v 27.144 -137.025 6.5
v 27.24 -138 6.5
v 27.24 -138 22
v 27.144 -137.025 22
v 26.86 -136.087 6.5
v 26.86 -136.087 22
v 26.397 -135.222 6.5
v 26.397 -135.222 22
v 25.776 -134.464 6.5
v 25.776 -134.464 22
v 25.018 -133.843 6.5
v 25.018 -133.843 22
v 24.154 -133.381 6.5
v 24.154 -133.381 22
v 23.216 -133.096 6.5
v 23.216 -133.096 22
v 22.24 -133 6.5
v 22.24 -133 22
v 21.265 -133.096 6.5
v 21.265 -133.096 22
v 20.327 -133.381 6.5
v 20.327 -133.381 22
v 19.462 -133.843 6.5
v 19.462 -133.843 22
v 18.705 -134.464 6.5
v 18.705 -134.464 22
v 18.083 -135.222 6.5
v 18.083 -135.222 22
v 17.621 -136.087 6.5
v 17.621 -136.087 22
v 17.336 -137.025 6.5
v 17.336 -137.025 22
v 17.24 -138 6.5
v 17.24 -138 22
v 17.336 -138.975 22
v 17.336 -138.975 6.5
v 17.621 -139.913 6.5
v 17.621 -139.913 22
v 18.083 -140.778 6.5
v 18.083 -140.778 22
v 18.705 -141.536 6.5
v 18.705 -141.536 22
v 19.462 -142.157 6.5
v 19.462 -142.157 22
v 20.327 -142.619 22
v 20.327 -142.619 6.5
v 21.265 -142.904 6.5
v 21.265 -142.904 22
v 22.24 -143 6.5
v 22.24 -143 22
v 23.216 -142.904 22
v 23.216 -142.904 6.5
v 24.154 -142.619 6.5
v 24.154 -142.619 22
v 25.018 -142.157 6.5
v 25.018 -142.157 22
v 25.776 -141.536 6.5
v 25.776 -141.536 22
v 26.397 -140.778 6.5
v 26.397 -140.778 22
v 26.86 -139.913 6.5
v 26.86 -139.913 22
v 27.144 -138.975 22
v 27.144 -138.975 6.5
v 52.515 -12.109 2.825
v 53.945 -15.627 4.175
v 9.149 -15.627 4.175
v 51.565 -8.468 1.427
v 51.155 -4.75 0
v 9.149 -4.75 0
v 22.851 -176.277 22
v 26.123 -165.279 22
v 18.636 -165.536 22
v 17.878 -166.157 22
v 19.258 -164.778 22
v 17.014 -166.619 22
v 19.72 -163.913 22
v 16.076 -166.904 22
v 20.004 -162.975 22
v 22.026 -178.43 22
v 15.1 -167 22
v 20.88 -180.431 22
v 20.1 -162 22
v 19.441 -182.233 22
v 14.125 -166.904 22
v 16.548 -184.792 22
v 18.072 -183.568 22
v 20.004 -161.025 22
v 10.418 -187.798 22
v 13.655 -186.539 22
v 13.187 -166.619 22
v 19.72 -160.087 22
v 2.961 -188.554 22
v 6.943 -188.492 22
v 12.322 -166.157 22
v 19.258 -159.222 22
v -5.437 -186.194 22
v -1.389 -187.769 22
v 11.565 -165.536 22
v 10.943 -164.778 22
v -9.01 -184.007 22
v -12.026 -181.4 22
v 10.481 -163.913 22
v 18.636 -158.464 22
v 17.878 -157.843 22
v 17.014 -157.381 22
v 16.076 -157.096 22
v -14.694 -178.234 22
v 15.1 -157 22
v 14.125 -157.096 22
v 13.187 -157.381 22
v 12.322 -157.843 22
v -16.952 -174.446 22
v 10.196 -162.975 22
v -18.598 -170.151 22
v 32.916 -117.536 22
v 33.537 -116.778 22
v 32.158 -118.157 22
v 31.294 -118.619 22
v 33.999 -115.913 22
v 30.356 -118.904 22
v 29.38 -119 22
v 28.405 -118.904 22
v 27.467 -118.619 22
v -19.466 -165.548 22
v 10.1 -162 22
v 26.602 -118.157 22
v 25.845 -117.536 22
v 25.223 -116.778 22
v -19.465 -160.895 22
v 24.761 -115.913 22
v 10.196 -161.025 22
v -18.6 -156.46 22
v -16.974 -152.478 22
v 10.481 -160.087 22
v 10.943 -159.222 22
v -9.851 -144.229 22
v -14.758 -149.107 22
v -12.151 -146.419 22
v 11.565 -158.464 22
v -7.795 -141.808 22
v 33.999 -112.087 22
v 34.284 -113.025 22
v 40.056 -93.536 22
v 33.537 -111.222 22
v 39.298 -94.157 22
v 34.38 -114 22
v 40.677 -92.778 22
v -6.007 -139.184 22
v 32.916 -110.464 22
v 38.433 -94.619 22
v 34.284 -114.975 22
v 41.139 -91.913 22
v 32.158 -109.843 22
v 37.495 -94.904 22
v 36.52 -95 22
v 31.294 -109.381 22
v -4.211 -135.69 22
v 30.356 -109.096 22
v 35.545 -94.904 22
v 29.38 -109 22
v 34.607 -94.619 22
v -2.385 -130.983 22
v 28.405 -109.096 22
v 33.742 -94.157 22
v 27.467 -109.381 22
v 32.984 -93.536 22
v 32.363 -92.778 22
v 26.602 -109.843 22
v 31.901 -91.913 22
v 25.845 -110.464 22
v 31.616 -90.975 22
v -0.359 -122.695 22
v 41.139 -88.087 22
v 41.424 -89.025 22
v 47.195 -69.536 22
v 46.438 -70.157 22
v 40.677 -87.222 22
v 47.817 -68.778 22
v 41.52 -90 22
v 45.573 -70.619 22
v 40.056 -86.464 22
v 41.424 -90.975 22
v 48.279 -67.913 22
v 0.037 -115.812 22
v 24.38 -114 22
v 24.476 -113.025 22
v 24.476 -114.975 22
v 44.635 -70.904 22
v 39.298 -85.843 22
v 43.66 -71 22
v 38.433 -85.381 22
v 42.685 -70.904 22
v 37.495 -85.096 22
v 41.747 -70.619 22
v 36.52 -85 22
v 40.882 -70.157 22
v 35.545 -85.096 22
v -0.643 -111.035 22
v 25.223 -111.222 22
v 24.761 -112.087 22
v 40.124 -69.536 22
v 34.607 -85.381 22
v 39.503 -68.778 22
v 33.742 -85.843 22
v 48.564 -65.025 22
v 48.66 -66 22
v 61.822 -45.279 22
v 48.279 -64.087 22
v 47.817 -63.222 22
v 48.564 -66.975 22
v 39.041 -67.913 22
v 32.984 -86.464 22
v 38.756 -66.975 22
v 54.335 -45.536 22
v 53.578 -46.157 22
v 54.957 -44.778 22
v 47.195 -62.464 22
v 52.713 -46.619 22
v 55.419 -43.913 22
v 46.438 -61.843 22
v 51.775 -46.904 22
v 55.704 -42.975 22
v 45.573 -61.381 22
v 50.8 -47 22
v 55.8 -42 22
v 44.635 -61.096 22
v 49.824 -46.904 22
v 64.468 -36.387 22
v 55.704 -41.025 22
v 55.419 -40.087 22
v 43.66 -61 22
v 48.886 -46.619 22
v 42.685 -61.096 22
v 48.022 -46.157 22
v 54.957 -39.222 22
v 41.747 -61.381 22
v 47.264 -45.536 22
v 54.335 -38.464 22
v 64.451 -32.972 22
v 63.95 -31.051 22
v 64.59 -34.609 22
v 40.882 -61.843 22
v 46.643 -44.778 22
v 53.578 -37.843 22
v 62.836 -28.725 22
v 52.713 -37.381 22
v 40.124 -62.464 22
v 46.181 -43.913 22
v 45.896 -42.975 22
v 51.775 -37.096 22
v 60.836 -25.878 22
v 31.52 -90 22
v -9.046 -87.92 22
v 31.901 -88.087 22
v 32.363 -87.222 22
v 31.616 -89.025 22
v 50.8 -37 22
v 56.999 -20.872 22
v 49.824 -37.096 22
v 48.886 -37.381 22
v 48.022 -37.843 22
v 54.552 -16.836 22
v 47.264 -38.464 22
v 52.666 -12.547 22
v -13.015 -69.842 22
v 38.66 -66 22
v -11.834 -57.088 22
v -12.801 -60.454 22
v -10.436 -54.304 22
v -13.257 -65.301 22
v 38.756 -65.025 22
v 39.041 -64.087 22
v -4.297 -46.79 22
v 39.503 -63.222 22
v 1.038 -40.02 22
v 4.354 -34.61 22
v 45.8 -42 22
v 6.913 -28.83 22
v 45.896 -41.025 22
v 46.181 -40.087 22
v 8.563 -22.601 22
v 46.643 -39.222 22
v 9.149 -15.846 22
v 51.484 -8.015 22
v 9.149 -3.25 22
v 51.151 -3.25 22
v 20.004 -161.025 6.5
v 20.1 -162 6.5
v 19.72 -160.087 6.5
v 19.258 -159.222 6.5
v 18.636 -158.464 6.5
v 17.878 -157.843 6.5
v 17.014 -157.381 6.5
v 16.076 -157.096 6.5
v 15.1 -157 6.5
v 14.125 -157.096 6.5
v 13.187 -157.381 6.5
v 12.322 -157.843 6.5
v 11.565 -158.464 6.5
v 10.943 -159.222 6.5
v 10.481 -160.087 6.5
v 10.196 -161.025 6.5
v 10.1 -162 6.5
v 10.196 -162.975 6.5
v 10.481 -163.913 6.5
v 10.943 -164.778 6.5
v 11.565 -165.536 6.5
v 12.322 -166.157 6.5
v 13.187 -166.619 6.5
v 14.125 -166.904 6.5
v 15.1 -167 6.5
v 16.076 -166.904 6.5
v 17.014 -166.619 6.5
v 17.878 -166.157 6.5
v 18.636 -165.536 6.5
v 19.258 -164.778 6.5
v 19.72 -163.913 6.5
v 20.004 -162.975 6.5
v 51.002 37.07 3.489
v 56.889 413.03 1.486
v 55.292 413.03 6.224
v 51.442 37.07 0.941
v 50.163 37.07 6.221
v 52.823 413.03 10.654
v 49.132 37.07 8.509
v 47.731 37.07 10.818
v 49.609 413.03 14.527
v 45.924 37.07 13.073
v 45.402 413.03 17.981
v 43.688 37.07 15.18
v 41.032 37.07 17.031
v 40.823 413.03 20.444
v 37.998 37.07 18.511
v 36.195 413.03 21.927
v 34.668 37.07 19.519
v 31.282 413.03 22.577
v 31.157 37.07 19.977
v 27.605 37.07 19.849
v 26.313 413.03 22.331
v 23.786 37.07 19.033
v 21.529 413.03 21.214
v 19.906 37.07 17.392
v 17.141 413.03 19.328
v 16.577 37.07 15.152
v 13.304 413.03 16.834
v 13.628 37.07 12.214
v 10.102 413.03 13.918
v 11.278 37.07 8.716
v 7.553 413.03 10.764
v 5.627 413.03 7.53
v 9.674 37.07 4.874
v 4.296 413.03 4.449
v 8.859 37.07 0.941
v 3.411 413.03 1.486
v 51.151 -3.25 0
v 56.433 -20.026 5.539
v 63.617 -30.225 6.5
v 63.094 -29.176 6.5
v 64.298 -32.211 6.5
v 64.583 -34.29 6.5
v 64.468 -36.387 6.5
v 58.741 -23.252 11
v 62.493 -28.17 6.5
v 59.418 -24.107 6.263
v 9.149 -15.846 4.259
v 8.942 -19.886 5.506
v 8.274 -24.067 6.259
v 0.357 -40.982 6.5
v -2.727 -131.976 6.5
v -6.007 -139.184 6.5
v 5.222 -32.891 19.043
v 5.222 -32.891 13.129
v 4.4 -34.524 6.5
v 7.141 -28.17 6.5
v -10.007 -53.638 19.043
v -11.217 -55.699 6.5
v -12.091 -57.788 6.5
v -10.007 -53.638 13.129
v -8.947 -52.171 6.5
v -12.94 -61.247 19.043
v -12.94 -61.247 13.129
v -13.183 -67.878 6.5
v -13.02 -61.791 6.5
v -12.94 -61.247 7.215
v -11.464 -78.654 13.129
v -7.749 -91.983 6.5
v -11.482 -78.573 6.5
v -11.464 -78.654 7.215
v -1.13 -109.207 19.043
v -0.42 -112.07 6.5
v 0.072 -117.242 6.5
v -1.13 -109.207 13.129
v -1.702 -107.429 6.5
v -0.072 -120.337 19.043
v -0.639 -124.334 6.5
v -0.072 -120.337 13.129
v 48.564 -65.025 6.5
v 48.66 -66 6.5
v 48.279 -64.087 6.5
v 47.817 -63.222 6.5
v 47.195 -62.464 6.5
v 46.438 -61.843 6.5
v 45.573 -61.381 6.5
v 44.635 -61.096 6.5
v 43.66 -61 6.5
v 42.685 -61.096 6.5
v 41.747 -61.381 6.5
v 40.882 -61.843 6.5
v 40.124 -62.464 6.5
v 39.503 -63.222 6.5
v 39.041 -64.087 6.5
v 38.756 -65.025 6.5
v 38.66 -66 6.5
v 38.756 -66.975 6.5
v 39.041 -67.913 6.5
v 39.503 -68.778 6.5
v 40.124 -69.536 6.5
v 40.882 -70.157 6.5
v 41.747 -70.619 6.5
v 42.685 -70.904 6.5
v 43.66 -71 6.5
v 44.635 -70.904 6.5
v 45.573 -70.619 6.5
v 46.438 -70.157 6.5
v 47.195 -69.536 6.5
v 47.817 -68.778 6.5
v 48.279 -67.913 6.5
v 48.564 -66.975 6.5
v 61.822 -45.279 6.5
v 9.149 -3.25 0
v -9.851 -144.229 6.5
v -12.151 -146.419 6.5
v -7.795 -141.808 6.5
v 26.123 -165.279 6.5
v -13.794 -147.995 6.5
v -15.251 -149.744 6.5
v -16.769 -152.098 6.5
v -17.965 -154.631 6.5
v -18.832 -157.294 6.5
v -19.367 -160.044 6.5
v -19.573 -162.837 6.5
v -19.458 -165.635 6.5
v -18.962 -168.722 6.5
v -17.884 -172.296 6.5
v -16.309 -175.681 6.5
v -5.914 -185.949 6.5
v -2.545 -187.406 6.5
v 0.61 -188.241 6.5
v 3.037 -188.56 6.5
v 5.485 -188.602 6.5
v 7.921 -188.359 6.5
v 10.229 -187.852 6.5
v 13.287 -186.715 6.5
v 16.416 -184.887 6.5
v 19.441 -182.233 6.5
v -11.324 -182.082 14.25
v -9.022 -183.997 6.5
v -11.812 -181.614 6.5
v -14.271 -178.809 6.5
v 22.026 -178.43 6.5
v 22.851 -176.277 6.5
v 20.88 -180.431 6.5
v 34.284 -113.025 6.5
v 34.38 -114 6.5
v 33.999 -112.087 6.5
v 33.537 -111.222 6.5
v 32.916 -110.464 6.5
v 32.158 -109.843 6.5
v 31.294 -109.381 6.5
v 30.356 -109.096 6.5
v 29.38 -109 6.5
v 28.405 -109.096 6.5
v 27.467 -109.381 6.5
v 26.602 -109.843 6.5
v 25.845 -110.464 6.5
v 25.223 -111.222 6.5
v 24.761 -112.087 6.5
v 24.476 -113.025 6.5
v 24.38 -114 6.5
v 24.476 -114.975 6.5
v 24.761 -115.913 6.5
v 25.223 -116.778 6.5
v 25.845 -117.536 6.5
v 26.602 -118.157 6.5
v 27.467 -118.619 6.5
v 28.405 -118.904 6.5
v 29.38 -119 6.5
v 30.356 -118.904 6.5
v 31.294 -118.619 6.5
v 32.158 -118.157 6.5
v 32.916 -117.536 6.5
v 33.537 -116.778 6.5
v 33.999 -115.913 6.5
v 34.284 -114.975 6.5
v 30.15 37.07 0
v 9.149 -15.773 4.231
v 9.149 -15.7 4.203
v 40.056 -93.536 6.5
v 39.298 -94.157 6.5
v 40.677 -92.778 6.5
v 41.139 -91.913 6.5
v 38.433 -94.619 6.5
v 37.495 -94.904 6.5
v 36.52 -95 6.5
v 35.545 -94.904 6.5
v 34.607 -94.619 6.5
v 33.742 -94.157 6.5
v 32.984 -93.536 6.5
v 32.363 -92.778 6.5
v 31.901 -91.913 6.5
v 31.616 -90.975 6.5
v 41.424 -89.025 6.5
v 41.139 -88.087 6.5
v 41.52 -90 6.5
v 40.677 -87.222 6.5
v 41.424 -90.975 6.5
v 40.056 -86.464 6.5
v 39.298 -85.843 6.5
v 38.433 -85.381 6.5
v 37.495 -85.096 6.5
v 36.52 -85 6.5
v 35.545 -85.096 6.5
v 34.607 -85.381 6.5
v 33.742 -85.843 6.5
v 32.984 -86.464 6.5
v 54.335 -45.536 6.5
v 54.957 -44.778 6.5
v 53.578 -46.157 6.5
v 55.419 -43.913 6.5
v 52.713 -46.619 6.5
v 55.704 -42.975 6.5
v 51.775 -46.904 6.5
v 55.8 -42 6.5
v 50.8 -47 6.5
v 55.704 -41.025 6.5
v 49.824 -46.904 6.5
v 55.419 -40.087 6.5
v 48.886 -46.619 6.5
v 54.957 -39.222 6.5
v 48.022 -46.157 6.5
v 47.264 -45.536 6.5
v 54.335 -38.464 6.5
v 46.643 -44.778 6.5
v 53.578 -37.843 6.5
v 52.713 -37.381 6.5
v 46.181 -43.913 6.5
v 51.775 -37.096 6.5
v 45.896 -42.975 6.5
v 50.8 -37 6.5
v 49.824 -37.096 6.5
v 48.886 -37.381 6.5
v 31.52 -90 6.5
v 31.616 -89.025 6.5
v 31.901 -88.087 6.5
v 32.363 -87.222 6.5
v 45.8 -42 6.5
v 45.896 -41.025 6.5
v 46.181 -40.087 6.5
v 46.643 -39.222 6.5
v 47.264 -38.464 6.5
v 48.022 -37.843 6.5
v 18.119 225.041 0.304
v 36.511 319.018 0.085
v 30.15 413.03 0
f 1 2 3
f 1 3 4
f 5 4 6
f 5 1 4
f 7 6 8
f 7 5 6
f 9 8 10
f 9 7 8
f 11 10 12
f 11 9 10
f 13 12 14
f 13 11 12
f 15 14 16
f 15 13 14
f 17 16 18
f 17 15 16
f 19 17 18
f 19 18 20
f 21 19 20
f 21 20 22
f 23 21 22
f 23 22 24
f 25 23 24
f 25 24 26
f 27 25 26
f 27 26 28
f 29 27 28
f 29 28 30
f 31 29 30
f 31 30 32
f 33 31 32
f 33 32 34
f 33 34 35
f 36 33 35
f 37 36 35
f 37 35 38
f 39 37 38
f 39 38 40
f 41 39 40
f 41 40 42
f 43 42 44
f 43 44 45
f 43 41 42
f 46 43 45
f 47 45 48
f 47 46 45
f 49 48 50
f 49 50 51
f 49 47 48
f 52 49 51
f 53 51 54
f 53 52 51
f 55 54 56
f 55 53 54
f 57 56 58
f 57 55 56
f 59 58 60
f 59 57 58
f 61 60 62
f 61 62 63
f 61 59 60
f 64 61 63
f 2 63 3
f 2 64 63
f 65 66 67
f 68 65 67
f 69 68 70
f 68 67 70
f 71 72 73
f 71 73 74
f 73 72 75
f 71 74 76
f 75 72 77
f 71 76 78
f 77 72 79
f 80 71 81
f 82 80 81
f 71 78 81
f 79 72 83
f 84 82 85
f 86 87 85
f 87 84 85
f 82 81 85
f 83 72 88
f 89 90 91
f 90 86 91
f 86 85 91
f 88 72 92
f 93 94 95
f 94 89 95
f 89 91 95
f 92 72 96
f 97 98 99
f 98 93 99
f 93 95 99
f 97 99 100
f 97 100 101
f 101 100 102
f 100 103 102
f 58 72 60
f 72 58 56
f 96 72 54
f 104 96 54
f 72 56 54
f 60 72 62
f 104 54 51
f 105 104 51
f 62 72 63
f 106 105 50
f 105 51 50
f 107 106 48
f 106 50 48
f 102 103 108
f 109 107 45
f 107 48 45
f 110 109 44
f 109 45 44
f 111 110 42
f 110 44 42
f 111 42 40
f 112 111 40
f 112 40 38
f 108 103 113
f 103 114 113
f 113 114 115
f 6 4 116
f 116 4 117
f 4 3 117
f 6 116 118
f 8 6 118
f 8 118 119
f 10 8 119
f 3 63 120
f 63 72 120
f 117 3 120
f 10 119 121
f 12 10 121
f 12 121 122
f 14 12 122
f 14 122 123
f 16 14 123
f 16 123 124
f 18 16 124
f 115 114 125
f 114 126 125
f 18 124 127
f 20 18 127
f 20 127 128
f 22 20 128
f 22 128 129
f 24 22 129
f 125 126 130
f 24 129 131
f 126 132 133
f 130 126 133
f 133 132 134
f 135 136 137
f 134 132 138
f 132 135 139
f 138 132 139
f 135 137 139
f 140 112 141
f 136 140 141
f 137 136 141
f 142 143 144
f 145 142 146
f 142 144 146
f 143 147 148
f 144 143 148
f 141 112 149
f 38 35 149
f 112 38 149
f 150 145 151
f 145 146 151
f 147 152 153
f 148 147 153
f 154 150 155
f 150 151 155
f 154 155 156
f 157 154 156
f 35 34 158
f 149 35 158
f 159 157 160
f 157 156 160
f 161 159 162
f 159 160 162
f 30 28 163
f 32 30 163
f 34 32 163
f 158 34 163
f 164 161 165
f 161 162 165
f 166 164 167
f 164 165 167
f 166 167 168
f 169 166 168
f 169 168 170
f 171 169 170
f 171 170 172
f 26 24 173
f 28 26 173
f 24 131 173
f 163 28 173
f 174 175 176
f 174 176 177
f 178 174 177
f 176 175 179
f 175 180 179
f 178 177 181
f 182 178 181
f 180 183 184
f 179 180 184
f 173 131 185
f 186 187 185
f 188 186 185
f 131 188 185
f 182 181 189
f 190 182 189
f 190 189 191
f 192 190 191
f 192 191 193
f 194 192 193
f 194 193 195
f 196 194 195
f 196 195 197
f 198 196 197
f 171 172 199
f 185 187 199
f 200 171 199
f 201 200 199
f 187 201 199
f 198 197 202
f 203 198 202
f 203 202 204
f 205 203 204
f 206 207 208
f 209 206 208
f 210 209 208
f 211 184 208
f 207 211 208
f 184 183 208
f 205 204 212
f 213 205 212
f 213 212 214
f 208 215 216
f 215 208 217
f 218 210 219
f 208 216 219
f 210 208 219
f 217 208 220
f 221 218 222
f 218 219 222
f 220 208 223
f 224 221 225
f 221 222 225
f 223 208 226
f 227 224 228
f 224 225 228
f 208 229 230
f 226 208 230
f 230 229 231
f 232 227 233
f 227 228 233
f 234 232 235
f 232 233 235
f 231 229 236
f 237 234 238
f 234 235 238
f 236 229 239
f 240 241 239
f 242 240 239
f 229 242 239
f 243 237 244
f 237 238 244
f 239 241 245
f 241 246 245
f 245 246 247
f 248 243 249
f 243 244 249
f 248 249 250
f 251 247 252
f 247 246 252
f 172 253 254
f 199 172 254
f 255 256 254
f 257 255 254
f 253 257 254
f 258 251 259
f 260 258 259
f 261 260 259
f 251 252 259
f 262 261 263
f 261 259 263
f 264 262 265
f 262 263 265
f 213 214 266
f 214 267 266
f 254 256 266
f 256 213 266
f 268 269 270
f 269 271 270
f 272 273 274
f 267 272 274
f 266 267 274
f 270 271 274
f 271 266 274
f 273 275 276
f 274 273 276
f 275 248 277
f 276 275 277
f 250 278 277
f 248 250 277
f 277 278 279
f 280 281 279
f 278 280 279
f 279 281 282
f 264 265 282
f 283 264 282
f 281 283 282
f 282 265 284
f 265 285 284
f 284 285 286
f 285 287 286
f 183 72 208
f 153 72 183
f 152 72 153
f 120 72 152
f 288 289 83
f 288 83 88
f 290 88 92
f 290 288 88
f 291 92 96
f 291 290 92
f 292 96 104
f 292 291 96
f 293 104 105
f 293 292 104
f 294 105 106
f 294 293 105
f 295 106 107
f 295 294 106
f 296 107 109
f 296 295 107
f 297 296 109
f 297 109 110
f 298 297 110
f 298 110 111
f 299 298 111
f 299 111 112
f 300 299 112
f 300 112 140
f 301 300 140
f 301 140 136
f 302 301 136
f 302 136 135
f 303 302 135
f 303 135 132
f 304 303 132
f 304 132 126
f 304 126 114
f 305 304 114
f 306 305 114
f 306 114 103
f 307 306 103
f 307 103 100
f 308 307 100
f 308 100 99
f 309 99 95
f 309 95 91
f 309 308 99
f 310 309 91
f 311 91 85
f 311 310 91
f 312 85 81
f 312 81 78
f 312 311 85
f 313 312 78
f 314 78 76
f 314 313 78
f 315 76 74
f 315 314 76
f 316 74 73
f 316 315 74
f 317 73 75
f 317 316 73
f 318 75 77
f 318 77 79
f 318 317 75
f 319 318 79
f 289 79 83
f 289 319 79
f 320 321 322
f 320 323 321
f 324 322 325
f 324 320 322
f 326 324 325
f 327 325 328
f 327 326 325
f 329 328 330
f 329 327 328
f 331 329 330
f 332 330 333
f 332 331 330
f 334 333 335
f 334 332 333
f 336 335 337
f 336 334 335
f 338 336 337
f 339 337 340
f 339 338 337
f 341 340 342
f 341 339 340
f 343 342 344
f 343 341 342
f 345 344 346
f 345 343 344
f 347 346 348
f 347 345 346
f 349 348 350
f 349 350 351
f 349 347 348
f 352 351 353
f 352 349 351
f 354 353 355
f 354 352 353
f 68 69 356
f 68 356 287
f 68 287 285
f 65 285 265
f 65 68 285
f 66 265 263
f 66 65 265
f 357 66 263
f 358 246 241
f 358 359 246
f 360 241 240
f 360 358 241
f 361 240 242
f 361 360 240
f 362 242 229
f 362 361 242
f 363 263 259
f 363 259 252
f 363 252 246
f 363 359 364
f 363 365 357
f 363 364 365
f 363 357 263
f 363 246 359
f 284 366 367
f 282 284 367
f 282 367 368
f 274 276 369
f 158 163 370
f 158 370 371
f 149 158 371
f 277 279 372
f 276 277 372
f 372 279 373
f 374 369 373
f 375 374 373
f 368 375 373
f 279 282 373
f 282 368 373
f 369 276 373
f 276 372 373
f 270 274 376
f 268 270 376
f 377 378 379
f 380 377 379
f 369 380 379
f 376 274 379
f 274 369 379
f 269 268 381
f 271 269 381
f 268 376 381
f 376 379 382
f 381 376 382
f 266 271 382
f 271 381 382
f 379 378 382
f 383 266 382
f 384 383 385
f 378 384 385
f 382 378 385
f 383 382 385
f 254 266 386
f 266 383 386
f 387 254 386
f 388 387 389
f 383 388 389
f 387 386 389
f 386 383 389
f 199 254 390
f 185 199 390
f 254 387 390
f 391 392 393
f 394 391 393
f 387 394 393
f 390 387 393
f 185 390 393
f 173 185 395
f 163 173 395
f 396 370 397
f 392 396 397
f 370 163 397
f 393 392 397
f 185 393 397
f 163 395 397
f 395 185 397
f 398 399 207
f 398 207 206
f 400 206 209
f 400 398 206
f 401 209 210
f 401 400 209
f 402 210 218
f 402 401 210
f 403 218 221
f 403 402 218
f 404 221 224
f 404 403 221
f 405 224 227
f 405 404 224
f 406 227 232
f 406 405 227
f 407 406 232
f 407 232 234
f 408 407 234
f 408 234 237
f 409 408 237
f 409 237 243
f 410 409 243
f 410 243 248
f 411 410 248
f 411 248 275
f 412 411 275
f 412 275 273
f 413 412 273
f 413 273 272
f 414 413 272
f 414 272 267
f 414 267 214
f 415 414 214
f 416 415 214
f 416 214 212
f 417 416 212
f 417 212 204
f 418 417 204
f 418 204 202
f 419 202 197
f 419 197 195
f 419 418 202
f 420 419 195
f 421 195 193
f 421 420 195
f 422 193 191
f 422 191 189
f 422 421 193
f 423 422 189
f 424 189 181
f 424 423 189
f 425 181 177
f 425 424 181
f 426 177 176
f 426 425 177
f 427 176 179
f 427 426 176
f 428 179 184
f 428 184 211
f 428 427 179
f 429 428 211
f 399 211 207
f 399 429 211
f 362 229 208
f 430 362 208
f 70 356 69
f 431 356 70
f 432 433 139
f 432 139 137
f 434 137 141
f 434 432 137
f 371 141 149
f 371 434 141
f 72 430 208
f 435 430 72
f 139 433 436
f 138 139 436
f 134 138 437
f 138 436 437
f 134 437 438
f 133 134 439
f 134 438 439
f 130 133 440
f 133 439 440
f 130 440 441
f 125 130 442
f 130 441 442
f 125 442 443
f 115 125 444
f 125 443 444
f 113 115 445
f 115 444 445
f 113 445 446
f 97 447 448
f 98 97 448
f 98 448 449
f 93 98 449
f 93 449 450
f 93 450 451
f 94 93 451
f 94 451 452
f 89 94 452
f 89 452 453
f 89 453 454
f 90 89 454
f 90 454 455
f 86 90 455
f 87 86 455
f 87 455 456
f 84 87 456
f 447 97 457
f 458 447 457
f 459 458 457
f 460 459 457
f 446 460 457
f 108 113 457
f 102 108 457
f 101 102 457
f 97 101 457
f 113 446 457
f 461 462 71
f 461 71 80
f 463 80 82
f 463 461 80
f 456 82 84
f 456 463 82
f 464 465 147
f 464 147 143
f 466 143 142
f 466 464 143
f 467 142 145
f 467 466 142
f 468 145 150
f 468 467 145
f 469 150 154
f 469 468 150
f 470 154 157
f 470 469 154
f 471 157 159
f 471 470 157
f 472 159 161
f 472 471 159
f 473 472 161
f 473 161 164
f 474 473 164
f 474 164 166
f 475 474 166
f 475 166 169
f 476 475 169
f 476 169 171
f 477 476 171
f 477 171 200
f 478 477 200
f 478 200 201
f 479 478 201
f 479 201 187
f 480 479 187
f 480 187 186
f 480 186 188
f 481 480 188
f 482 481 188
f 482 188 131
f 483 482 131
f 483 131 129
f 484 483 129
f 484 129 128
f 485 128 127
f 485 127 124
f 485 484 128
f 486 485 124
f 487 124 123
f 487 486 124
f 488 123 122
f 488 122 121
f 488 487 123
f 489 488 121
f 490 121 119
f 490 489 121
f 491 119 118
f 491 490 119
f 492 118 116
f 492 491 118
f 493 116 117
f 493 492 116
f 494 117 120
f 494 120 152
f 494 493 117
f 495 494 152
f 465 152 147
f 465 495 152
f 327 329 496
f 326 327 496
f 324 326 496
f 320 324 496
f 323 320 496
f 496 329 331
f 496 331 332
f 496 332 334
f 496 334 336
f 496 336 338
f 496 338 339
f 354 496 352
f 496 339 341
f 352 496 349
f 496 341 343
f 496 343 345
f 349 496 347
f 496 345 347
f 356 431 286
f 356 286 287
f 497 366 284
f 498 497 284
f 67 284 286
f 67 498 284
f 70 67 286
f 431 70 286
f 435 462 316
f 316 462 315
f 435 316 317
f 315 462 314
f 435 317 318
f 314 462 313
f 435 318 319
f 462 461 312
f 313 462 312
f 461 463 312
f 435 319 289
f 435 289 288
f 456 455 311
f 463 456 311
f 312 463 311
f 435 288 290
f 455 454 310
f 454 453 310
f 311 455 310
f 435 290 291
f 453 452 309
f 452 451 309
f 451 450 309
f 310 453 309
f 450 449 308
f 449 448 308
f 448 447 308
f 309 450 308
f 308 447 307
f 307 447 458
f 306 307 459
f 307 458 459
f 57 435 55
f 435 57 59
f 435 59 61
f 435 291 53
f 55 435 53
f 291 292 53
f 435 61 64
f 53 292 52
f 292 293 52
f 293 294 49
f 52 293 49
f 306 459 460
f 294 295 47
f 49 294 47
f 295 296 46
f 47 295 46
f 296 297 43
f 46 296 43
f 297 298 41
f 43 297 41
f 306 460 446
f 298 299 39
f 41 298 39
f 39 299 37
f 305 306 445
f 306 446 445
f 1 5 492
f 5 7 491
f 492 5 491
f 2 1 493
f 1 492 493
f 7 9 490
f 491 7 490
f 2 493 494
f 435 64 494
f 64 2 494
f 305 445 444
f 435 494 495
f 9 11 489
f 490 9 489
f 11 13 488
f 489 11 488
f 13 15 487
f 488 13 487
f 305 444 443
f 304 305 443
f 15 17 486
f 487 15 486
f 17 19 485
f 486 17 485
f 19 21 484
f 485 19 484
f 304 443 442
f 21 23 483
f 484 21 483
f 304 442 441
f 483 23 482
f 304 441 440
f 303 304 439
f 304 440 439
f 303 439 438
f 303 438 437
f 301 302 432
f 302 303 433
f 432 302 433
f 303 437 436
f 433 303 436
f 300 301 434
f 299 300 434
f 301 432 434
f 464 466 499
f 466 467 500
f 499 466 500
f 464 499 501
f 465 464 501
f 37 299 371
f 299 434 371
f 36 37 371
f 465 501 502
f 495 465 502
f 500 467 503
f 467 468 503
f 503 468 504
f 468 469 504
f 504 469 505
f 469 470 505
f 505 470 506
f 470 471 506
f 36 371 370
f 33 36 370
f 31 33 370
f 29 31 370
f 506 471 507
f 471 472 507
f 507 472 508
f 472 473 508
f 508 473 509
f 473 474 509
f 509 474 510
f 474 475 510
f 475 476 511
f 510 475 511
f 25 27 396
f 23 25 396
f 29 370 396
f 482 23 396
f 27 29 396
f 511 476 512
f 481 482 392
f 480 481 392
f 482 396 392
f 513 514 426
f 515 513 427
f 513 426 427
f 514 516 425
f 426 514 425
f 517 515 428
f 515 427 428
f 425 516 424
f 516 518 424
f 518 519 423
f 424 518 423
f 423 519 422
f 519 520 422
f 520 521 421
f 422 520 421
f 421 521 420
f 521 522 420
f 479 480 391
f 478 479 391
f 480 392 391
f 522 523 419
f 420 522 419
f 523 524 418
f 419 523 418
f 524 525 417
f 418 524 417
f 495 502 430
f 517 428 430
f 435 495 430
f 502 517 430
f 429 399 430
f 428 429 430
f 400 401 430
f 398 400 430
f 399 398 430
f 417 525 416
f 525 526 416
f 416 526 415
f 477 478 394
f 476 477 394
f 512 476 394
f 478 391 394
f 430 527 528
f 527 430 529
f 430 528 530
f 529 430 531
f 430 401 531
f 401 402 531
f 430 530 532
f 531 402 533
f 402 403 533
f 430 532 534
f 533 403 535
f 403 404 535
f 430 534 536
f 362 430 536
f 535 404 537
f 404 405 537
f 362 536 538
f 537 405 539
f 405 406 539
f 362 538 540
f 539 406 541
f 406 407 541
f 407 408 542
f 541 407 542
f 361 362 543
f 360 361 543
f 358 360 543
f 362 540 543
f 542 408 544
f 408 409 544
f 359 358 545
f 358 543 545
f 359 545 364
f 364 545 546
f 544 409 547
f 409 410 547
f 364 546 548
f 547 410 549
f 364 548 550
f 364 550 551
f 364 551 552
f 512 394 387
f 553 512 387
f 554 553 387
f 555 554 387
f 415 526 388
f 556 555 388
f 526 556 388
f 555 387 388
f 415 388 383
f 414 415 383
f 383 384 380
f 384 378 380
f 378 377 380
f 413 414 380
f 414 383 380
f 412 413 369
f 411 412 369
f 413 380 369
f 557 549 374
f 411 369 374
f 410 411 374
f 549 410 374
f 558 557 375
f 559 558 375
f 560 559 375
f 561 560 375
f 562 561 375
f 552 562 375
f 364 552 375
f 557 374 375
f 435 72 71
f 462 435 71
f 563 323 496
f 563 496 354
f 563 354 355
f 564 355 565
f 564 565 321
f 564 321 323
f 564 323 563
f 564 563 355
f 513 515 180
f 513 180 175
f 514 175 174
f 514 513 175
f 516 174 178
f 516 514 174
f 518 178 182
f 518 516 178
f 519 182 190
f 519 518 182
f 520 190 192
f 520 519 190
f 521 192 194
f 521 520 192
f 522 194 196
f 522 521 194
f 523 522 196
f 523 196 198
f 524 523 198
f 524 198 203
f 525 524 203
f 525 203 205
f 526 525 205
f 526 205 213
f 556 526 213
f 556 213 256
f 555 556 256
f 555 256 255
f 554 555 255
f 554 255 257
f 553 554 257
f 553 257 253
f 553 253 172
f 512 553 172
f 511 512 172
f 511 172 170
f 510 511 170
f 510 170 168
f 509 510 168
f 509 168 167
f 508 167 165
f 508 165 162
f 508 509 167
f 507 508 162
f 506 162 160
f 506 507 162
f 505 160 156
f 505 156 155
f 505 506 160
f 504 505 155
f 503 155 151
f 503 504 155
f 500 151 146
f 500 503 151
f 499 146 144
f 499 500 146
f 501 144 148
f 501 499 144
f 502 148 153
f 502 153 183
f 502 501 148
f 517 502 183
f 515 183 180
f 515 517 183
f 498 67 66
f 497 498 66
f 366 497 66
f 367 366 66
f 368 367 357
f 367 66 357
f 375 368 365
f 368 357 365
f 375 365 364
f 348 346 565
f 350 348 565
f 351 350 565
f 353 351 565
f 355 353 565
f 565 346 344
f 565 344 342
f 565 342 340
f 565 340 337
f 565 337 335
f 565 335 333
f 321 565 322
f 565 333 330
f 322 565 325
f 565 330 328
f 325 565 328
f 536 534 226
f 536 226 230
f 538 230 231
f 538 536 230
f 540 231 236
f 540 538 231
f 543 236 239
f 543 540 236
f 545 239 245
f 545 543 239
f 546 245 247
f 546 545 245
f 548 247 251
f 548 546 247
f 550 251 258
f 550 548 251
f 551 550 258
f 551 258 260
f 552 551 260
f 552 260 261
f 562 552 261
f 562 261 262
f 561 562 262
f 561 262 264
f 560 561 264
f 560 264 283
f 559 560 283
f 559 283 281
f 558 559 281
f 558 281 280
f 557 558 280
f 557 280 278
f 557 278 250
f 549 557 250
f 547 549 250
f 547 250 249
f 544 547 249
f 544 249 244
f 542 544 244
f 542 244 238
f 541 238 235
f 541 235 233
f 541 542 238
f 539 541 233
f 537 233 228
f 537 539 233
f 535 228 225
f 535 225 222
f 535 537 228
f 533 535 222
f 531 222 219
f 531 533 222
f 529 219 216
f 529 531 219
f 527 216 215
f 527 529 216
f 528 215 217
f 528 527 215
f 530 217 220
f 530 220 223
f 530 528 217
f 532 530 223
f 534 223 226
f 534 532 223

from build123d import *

# Parameters (mm, degrees)
SKETCH7_R               = 5
BOSS_EXTRUDE1_DEPTH     = 22
CUT_EXTRUDE1_DEPTH      = 89
CUT_EXTRUDE1_DEPTH_BACK = 47
FILLET1_R               = 35
FILLET2_START           = 6
FILLET2_DEPTH           = 17


with BuildPart() as part:
    # Sketch4 for Loft1 → Loft1 section 0
    with BuildSketch(Plane(origin=(0, 413.03, 0), x_dir=(1, 0, 0), z_dir=(0, 1, 0))):
        with BuildLine():
            # circular arc as an exact rational Bezier (weights 1, cos(half-angle), 1)
            Bezier((3.411173818, -1.486067363), (30.150054, 1.495276154), (56.888934182, -1.486067363), weights=[1, 0.993841412, 1])
            Bezier((56.888934182, -1.486067363), (30.150054, -113.662589607), (3.411173818, -1.486067363), weights=[1, 0.231868224, 1])
        make_face()
    # Sketch2 for Loft1 → Loft1 section 1
    with BuildSketch(Plane(origin=(0, 37.07, 0), x_dir=(1, 0, 0), z_dir=(0, 1, 0))):
        with BuildLine():
            Bezier((51.441561571, -0.941181345), (30.150054, 0.944866761), (8.858546429, -0.941181345), weights=[1, 0.996099539, 1])
            Bezier((8.858546429, -0.941181345), (30.150054, -192.779980086), (51.441561571, -0.941181345), weights=[1, 0.110309138, 1])
        make_face()
    loft()


with BuildPart() as body_2:
    # Sketch7 → Boss-Extrude1 (new body)
    with BuildSketch(Plane.XY):
        with BuildLine():
            Line((61.822469128, -45.279185569), (26.122769128, -165.279185569))
            Line((26.122769128, -165.279185569), (22.169953883, -178.566071157))
            add(Edge.make_bspline(
                [(-12.150661674, -146.419210188), (-31.612509099, -163.079183622), (-11.324326994, -182.08237919), (8.963855111, -201.085574758), (22.169953883, -178.566071157)],
                knots=[3.317459121, 3.317459121, 3.317459121, 5.043045062, 5.043045062, 6.768631003, 6.768631003, 6.768631003], degree=2, weights=[1, 0.650318294, 1, 0.650318294, 1]))
            ThreePointArc((-12.150661674, -146.419210188), (-8.791094197, -143.046061953), (-6.007432727, -139.183931522))
            add(Edge.make_bspline(
                [(9.14908, -15.846186083), (9.141550363, -28.501152073), (1.420403196, -41.2547005), (-15.149336893, -58.17130706), (-12.026921138, -78.76359191), (-6.30179243, -97.365876925), (3.428380257, -117.152927923), (-3.255551817, -134.645669988), (-6.007432727, -139.183931522)],
                knots=[0, 0, 0, 0, 0.241122102, 0.315889977, 0.476811467, 0.625347755, 0.735303781, 0.929974714, 0.929974714, 0.929974714, 0.929974714], degree=3))
            Line((9.14908, -15.846186083), (9.14908, -3.25))
            Line((9.14908, -3.25), (51.151028, -3.25))
            add(Edge.make_bspline(
                [(51.151028, -3.25), (50.937550111, -10.767323465), (56.483762161, -22.000731952), (65.296265302, -30.566236086), (64.46789676, -36.386917125)],
                knots=[0, 0, 0, 0, 0.598162067, 1, 1, 1, 1], degree=3))
            Line((64.46789676, -36.386917125), (61.822469128, -45.279185569))
        make_face()
        with Locations((50.799904, -42)):
            Circle(SKETCH7_R, mode=Mode.SUBTRACT)
        with Locations((43.659964, -66)):
            Circle(SKETCH7_R, mode=Mode.SUBTRACT)
        with Locations((36.520024, -90)):
            Circle(SKETCH7_R, mode=Mode.SUBTRACT)
        with Locations((29.380084, -114)):
            Circle(SKETCH7_R, mode=Mode.SUBTRACT)
        with Locations((22.240144, -138)):
            Circle(SKETCH7_R, mode=Mode.SUBTRACT)
        with Locations((15.100204, -162)):
            Circle(SKETCH7_R, mode=Mode.SUBTRACT)
    extrude(amount=BOSS_EXTRUDE1_DEPTH)

    # Sketch9 → Cut-Extrude1 (cut, two sides: drawn at the far end of the back side and taken through both)
    with BuildSketch(Plane(origin=(0, 0, 0), x_dir=(0, 0, -1), z_dir=(1, 0, 0)).offset(-CUT_EXTRUDE1_DEPTH_BACK)):
        Polygon((0, -4.75), (0, -188.619559547), (-6.5, -188.619559547), (-6.5, -21.683078921), align=None)
    extrude(amount=CUT_EXTRUDE1_DEPTH + CUT_EXTRUDE1_DEPTH_BACK, mode=Mode.SUBTRACT)

    # Fillet1
    fillet1_edges = [body_2.edges().sort_by_distance(p)[0] for p in [
        (33.140560044, -21.683078921, 6.5),
    ]]
    fillet(fillet1_edges, radius=FILLET1_R)

    # Fillet2: read off the stored shape, not the designer's step
    # Fillet2 outline → Fillet2 (cut)
    with BuildSketch(Plane.XY.offset(FILLET2_START)):
        with BuildLine():
            Line((22.169953883, -178.566071157), (22.850975257, -176.276904444))
            ThreePointArc((22.850975257, -176.276904444), (21.491301478, -179.452388519), (19.441266868, -182.232634909))
            add(Edge.make_bspline(
                [(19.441266868, -182.232634909), (20.998606375, -180.56349408), (22.169953883, -178.566071157)],
                knots=[6.54399072, 6.54399072, 6.54399072, 6.768631003, 6.768631003, 6.768631003], degree=2, weights=[0.920807815, 0.954477725, 1]))
        make_face()
    extrude(amount=FILLET2_DEPTH, mode=Mode.SUBTRACT)


solid = Compound([part.part, body_2.part])
